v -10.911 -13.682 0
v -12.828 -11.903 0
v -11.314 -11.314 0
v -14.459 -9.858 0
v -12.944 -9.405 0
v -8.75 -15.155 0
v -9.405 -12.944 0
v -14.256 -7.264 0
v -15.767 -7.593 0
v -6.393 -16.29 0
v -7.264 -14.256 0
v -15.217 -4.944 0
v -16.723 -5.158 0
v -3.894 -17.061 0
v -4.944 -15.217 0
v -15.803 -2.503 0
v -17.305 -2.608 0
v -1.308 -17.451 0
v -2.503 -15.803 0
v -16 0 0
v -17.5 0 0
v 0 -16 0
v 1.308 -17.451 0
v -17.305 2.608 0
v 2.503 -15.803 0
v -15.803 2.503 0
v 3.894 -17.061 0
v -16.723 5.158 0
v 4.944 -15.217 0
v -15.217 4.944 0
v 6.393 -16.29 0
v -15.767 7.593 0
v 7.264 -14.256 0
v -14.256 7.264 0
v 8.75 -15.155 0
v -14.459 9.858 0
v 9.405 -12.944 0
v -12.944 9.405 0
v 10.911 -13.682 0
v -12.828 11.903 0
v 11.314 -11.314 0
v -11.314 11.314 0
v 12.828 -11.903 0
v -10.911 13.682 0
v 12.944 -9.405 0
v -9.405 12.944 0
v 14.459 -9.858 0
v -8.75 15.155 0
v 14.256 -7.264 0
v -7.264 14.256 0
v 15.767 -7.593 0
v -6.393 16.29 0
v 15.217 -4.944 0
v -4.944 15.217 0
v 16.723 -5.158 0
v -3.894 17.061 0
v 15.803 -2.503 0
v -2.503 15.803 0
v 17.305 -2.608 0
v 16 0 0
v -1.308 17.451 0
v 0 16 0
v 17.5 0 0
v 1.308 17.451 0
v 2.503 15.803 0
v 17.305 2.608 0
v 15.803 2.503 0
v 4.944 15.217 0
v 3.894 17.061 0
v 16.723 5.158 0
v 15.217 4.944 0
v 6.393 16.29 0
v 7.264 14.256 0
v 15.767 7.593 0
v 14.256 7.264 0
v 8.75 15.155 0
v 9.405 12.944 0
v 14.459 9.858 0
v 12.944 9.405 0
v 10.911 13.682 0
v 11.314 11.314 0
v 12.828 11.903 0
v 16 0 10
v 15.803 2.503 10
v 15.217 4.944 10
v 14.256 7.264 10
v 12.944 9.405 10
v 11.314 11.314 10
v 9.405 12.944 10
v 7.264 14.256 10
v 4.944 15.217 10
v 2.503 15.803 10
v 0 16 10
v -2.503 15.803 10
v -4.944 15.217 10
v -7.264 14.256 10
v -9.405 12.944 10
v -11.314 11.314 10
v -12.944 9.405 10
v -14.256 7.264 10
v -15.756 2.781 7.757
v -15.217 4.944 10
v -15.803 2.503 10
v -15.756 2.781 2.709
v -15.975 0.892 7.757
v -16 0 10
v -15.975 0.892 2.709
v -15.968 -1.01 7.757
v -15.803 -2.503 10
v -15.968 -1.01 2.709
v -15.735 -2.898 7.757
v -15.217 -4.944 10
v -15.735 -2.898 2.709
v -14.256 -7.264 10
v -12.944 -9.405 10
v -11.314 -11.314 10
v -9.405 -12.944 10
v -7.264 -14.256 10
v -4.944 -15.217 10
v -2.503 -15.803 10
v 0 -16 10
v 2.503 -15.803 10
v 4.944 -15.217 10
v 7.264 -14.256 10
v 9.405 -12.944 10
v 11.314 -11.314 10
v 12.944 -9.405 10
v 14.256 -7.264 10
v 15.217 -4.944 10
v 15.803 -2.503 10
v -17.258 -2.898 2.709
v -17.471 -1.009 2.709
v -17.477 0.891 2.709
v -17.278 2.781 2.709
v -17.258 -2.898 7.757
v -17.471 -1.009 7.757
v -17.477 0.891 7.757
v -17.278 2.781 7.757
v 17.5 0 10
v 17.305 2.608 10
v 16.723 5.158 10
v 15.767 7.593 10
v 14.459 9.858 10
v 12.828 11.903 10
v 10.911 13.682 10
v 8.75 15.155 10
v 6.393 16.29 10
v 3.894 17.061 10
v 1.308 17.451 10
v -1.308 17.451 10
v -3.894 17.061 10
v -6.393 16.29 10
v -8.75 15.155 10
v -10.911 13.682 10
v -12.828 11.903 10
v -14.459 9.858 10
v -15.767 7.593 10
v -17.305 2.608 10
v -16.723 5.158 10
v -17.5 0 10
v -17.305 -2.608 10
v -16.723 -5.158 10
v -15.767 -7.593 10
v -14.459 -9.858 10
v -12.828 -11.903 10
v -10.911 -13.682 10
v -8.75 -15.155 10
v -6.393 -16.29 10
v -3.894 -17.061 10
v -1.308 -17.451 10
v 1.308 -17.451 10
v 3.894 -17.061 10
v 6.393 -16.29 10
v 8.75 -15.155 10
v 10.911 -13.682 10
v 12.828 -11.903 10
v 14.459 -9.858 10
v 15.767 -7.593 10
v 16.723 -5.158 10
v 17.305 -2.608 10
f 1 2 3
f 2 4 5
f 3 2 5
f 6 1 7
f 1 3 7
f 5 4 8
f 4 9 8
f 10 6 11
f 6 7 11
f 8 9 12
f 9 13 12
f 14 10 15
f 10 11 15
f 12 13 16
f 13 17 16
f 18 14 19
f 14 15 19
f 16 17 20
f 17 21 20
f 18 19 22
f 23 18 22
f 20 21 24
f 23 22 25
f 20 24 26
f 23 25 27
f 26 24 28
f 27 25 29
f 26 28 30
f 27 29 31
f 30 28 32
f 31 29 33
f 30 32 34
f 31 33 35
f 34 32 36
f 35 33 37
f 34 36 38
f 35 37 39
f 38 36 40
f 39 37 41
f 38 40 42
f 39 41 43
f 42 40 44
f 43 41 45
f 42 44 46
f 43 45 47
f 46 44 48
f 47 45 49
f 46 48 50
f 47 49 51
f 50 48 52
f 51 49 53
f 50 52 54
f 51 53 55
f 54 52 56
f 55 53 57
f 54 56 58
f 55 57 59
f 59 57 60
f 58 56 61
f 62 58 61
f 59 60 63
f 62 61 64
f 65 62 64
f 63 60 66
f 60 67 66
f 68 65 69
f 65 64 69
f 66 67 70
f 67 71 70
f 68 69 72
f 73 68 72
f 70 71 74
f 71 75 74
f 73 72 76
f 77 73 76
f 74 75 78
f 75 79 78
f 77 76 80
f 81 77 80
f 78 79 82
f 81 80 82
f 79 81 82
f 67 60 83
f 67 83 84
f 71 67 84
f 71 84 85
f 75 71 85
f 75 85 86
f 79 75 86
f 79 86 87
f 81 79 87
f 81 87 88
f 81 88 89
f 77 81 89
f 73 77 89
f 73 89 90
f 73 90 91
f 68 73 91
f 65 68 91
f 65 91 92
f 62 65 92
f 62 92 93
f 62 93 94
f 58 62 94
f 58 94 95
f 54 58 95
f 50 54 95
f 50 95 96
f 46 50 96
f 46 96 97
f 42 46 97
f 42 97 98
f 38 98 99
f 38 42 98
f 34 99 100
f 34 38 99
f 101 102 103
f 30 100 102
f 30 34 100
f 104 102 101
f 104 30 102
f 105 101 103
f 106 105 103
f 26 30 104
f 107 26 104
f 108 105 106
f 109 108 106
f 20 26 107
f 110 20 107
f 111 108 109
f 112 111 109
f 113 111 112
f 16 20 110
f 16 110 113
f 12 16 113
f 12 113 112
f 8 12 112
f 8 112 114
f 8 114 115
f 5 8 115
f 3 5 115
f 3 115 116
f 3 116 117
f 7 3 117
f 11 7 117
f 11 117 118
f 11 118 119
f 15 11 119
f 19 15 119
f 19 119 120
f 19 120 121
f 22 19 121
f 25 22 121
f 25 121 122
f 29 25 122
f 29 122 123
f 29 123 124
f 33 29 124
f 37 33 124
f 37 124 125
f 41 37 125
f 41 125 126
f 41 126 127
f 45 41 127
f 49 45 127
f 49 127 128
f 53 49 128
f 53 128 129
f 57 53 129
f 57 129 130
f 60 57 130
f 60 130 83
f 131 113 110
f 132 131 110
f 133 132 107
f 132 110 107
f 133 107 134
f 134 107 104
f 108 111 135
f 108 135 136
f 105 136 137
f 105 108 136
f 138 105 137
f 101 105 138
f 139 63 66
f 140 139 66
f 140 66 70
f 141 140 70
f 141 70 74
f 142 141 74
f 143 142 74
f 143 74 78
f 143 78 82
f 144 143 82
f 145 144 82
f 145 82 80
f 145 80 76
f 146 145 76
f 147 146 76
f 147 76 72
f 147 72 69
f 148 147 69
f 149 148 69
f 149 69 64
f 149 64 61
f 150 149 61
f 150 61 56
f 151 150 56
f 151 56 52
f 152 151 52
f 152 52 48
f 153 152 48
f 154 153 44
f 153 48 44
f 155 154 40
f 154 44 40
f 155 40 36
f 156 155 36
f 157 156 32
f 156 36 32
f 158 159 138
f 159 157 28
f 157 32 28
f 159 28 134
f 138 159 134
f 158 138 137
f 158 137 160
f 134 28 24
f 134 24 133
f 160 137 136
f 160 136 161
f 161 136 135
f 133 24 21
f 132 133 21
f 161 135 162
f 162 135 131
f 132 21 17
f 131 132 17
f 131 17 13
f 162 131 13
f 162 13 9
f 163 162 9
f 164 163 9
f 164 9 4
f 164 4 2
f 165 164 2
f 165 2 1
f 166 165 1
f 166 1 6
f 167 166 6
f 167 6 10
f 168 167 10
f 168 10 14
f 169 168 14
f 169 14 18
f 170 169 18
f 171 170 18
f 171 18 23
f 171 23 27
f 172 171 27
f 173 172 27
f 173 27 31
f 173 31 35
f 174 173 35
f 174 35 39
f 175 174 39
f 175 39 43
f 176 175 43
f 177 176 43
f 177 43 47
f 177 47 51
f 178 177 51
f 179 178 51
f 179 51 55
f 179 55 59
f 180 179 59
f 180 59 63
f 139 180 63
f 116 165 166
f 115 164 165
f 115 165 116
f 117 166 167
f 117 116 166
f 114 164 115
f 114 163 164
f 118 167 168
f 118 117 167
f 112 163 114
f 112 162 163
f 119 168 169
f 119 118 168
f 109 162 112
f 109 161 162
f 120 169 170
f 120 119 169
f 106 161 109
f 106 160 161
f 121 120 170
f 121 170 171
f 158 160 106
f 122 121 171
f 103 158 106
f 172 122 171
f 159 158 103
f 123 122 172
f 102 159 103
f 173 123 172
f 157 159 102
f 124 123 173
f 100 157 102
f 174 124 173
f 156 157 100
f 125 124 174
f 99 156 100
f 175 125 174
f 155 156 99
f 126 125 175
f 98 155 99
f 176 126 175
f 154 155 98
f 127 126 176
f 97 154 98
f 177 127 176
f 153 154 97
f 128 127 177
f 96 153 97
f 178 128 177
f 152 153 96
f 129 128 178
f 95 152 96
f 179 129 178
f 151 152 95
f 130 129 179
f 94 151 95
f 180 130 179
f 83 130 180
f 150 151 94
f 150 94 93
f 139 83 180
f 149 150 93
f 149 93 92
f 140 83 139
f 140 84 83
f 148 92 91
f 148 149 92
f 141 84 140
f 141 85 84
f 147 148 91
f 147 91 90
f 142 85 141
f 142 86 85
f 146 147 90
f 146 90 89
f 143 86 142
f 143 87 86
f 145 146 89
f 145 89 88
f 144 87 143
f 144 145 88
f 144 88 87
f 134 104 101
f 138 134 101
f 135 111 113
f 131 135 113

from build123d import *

# Parameters (mm, degrees)
F0_R     = 17.5
F0_R_2   = 16
F1_DEPTH = 10
F2_W     = 5.6790858507
F2_H     = 2.5240386603
F2_H_2   = 1.5144229401
F2_H_3   = 1.0096157202
F3_DEPTH = 25


with BuildPart() as f1:
    # F0 (on Top) → F1 (new body)
    with BuildSketch(Plane.XY):
        Circle(F0_R)
        Circle(F0_R_2, mode=Mode.SUBTRACT)
    extrude(amount=F1_DEPTH)

    # F2 (on Right) → F3 (cut)
    with BuildSketch(Plane.YZ):
        with Locations((-0.0582132488, 6.4953924739)):
            Rectangle(F2_W, F2_H)
        with Locations((-0.0582132488, 3.4665459534)):
            Rectangle(F2_W, F2_H_2)
        with Locations((-0.0582132488, 4.7285652836)):
            Rectangle(F2_W, F2_H_3)
    extrude(amount=-F3_DEPTH, mode=Mode.SUBTRACT)


solid = f1.part
